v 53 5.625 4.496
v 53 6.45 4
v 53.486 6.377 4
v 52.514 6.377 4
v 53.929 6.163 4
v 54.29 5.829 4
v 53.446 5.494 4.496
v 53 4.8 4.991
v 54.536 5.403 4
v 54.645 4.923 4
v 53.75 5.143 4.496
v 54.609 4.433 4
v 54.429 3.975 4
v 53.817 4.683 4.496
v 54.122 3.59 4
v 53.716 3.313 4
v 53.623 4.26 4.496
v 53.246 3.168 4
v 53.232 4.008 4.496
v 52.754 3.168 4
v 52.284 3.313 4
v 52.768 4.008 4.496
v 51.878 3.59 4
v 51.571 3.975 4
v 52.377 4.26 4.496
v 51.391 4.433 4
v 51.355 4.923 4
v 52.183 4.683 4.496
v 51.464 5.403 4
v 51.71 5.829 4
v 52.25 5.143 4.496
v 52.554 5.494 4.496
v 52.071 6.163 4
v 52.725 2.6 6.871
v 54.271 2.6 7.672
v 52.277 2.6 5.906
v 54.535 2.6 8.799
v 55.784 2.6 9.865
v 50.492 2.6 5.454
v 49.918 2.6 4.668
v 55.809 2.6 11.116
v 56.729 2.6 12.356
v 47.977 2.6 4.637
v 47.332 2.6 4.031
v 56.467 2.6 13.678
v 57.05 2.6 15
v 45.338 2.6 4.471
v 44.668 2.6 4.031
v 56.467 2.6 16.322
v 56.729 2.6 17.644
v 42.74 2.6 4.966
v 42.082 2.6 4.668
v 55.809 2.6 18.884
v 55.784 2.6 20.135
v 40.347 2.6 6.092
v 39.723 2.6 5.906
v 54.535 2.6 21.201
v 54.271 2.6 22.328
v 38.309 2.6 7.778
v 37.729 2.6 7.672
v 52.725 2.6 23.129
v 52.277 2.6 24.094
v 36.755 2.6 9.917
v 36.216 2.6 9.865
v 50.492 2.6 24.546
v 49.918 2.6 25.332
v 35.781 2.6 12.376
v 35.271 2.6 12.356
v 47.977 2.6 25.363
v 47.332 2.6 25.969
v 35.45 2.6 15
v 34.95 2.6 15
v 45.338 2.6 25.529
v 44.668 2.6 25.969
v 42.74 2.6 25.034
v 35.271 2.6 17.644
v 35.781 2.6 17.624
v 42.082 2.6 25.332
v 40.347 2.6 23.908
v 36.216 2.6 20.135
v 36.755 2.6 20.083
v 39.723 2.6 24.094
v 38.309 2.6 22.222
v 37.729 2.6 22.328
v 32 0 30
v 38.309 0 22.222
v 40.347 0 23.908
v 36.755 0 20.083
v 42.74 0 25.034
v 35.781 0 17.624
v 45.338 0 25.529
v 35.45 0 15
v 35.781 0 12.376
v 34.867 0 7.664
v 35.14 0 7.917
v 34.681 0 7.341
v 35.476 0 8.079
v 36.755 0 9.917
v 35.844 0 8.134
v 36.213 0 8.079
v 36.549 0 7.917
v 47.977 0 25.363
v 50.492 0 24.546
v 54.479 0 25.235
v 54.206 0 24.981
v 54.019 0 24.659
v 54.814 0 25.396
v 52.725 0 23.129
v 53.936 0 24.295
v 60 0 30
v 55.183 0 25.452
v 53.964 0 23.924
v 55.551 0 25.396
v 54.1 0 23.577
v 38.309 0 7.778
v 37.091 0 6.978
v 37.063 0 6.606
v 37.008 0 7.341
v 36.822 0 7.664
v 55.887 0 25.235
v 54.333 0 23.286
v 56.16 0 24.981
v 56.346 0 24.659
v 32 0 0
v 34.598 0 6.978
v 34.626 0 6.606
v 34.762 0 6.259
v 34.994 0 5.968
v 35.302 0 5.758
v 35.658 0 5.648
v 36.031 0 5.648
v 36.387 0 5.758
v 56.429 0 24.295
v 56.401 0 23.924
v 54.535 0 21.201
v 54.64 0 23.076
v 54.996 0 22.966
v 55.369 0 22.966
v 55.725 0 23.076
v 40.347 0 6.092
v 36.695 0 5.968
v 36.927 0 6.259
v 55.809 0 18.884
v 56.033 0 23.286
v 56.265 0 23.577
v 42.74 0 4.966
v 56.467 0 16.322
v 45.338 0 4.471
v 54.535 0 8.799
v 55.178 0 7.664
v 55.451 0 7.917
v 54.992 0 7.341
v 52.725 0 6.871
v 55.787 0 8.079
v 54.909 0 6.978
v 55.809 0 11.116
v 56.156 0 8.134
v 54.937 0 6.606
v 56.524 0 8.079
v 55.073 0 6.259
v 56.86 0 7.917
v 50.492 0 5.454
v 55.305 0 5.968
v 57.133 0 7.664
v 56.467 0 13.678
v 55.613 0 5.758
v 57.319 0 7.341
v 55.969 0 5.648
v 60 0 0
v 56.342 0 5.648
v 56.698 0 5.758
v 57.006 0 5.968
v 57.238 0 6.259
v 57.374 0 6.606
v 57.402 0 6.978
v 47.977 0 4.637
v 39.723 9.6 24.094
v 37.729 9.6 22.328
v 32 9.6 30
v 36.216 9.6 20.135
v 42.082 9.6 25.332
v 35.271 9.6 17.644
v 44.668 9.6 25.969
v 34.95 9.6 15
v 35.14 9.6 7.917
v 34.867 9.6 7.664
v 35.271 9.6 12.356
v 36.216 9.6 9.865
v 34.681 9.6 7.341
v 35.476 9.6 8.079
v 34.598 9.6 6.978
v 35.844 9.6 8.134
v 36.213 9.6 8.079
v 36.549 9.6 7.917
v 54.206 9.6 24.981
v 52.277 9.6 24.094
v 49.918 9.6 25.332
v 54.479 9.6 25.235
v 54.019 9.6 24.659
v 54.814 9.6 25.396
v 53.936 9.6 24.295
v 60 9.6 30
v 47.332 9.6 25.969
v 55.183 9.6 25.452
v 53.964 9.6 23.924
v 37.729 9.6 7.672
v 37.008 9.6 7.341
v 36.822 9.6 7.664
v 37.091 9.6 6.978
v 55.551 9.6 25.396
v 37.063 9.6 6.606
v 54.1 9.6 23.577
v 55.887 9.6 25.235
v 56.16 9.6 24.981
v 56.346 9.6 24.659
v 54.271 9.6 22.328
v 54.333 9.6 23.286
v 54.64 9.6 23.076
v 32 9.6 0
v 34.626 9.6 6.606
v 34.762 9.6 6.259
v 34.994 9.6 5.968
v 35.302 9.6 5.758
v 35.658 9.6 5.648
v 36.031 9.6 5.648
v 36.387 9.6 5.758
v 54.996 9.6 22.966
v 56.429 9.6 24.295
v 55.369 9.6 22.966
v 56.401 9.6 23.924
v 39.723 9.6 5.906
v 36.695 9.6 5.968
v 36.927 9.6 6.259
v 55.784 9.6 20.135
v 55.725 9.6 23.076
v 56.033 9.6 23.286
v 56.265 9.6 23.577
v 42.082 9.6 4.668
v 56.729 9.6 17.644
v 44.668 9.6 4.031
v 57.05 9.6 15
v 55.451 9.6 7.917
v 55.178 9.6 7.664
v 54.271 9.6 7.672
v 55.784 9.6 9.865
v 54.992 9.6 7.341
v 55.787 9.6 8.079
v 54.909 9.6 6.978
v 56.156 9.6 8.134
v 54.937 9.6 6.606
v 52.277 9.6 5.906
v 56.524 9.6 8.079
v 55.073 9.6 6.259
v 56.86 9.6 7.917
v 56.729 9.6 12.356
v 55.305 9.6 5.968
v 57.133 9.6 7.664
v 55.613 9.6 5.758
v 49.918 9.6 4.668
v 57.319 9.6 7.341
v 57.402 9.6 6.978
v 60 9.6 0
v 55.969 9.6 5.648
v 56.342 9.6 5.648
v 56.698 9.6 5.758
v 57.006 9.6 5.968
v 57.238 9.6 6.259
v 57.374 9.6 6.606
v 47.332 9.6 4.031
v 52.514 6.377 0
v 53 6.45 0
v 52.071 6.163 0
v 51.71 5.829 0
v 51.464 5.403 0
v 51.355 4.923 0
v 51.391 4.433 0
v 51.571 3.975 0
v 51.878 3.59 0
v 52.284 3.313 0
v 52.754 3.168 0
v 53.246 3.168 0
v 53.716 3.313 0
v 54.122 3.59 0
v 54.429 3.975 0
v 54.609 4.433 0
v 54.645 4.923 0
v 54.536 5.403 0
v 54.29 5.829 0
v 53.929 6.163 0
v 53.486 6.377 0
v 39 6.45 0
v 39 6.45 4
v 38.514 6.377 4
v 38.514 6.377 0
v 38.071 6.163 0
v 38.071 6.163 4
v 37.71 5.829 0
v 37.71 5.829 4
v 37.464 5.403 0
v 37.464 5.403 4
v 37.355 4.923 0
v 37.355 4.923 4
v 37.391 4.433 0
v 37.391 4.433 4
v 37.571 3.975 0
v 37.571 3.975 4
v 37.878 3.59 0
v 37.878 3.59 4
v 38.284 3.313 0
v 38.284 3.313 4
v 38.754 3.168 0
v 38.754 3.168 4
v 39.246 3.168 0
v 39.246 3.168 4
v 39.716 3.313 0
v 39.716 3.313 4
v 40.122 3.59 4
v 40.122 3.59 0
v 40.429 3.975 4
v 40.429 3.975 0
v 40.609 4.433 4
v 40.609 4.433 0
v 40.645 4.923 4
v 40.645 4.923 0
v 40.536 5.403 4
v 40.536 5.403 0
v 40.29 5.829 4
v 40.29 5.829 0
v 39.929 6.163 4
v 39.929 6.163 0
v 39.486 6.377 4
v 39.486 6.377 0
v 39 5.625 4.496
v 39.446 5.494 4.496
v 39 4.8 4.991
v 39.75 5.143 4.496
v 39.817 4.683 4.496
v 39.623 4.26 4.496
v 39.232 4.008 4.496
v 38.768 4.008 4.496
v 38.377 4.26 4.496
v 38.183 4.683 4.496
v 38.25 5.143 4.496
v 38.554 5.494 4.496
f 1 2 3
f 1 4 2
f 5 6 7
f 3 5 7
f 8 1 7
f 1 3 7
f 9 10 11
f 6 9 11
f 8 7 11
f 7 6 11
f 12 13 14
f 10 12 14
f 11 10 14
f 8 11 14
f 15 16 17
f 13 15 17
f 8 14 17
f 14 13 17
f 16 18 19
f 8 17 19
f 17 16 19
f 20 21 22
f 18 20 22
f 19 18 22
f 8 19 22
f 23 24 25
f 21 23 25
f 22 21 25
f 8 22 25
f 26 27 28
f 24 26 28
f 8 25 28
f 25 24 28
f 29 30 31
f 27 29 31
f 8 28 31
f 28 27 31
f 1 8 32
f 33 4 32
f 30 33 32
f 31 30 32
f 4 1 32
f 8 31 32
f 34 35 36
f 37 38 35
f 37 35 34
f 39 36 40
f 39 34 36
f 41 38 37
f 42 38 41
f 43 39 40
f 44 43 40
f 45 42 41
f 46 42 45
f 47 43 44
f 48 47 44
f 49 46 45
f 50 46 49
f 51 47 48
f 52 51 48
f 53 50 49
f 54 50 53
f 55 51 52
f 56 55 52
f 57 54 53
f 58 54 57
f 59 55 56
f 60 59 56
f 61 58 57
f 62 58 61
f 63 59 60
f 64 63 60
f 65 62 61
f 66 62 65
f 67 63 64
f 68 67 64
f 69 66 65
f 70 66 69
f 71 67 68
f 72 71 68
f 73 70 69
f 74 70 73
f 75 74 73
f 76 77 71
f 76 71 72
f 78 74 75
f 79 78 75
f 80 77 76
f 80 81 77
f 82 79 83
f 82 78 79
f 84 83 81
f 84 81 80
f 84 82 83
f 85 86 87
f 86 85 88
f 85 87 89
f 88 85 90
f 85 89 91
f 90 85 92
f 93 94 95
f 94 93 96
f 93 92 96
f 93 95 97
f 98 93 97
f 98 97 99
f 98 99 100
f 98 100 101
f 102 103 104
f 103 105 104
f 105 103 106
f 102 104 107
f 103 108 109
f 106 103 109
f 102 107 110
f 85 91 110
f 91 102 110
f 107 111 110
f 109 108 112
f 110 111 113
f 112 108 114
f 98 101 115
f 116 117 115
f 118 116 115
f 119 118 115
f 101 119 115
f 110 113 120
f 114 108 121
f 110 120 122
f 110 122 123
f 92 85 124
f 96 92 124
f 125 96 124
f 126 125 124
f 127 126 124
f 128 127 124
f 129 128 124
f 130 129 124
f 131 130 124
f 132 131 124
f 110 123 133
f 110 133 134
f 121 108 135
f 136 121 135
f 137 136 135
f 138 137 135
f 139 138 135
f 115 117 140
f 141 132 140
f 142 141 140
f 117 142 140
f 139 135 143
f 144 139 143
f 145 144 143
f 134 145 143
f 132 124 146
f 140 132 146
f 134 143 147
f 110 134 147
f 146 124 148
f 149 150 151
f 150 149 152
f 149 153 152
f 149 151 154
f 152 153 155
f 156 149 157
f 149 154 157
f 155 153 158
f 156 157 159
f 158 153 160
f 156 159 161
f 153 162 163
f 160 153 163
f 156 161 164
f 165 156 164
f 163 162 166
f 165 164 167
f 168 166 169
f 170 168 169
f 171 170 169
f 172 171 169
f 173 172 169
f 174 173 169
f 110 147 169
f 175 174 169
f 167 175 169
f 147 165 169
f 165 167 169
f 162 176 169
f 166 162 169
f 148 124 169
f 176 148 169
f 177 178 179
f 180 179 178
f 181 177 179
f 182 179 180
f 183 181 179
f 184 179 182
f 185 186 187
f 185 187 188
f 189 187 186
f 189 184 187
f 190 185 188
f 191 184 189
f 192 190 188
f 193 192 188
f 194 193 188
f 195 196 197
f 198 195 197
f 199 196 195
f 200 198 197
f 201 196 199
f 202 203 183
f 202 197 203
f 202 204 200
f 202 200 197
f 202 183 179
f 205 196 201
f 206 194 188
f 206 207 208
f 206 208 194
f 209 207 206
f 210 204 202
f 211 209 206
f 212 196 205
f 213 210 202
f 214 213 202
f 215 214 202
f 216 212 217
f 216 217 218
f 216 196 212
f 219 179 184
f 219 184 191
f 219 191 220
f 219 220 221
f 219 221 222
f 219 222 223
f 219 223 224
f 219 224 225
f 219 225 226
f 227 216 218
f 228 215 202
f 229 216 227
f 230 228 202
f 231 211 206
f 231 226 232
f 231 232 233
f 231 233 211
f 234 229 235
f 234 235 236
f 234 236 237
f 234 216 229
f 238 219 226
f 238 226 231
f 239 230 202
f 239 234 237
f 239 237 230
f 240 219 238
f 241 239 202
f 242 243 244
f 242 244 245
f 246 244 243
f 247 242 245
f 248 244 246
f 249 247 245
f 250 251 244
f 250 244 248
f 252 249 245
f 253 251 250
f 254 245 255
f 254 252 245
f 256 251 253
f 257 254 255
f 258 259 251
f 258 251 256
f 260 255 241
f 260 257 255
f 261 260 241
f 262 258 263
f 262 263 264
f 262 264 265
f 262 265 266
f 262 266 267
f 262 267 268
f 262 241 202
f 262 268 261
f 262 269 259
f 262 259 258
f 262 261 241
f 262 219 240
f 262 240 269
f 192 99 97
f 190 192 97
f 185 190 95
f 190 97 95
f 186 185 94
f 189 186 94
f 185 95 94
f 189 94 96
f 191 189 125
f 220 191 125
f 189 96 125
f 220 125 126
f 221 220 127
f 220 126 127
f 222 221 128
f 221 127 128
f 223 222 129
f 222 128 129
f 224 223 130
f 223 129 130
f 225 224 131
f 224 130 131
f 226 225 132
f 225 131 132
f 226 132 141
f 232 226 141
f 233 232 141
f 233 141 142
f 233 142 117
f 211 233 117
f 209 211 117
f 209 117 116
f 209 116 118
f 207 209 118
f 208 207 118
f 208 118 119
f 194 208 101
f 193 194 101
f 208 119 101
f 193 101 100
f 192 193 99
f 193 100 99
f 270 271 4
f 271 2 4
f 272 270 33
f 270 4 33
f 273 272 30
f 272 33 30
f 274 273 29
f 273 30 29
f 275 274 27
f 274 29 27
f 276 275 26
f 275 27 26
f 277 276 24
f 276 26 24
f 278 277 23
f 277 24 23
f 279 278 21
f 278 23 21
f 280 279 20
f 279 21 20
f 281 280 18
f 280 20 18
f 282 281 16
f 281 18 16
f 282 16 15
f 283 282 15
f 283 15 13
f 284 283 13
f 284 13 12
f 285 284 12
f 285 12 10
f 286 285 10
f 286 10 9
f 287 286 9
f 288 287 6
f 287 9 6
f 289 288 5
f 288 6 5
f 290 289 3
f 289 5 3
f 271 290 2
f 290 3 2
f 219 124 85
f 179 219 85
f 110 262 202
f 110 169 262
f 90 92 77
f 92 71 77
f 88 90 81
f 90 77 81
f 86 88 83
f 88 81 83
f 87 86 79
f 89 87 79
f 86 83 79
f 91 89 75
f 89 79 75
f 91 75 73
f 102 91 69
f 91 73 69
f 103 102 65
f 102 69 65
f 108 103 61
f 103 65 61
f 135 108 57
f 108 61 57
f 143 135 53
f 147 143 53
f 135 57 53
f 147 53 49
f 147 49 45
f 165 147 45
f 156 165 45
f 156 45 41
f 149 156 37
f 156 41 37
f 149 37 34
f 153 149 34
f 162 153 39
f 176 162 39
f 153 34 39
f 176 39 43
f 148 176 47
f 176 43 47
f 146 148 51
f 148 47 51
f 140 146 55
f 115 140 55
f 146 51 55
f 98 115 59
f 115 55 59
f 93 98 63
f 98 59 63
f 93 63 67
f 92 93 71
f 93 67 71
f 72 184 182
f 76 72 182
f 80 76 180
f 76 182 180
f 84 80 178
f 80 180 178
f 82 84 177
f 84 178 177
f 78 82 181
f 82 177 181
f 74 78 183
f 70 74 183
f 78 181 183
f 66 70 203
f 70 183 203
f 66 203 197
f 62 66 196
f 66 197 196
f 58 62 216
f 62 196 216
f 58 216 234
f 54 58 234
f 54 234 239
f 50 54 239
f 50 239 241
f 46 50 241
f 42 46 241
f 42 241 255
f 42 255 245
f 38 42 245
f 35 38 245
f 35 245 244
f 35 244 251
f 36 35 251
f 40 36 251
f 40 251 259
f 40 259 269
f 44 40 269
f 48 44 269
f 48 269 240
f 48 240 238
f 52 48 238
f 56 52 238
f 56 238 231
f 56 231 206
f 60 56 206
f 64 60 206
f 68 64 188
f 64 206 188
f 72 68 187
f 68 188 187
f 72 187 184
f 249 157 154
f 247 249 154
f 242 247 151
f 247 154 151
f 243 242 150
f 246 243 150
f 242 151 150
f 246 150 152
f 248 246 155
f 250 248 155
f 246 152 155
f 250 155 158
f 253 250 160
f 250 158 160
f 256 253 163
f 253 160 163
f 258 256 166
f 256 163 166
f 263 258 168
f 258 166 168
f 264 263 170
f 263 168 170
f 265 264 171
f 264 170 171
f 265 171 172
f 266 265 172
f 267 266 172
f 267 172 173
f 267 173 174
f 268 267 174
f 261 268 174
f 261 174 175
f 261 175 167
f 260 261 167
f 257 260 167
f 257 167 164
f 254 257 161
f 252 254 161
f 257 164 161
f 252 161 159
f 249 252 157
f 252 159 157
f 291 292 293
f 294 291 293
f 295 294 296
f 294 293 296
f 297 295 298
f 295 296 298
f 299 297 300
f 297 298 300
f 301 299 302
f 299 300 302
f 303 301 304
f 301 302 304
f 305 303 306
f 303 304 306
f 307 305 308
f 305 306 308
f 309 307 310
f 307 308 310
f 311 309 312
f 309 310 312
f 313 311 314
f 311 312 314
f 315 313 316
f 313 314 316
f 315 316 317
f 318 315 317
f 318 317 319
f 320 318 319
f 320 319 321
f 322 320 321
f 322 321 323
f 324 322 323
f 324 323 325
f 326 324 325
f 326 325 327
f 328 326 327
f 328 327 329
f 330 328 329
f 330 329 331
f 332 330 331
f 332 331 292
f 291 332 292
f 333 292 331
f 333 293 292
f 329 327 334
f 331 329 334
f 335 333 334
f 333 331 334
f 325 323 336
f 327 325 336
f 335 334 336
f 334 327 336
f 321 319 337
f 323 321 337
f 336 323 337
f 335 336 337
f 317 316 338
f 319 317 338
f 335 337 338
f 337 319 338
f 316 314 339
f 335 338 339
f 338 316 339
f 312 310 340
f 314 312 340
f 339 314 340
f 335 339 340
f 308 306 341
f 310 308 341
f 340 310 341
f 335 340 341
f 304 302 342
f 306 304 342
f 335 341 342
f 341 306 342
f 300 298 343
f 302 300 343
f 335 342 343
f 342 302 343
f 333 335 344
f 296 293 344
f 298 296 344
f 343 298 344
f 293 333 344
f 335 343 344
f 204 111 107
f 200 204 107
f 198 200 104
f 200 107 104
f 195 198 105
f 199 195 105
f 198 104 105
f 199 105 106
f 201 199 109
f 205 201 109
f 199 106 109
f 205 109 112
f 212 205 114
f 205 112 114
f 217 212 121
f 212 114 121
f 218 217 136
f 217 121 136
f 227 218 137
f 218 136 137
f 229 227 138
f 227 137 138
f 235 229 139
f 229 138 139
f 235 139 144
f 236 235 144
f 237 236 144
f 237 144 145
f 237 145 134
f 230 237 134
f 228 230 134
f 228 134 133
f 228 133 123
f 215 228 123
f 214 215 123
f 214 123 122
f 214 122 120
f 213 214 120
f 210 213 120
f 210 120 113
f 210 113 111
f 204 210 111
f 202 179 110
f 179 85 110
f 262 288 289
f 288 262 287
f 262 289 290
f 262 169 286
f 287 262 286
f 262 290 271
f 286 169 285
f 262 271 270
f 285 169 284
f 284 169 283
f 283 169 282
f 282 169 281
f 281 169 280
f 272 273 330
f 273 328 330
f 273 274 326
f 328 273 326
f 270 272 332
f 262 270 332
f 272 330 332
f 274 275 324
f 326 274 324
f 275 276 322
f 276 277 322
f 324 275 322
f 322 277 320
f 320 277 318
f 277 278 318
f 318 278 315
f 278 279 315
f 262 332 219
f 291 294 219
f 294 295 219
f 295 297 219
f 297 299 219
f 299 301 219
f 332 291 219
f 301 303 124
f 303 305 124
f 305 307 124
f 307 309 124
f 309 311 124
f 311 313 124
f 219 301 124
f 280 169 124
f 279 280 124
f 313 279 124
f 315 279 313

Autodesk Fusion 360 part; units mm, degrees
sketch "Sketch1" plane through (0, 0, 0) normal (0, 1, 0) x (1, 0, 0)
  line L0 (60, 0) -> (60, -30)
  line L1 (0, -15) -> (60, -15) construction
  line L2 (32, 0) -> (32, -30) construction
  line L3 (46, 0) -> (46, -30) construction
  line L4 (60, 0) -> (32, 0)
  line L5 (32, 0) -> (32, -30)
  line L6 (32, -30) -> (60, -30)
  line L7 (60, -30) -> (60, 0)
  dimension "d39" = 14
  dimension "d40" = 28
  dimension "d42" = 30
extrude "Extrude1" add sketch "Sketch1" along normal blind 9.6
sketch "Sketch2" plane through (0, 9.6, 0) normal (0, 1, 0) x (-1, 0, 0)
  line L0 (-60, 30) -> (-60, 0)
  circle A0 centre (-46, 15) radius 11.05
  circle A1 centre (-46, 15) radius 10.55
  line L1 (-60, 0) -> (-32, 0)
  line L2 (-32, 0) -> (-32, 30)
  line L3 (-32, 30) -> (-60, 30)
  dimension "d15" = 22.1
  dimension "d16" = 21.1
extrude "Extrude2" cut sketch "Sketch2" against normal blind 7 contours A0
extrude "Extrude3" cut 1 faces at (43.0944, 9.6, 14.0673) along direction (0, 1, 0) through all and the other way through all
sketch "Sketch3" plane through (0, 9.6, 0) normal (0, 1, 0) x (-1, 0, 0)
  line L0 (-60, 30) -> (-60, 0)
  circle A0 centre (-46, 15) radius 13 construction
  line L1 (-32, 30) -> (-60, 30)
  line L2 (-60, 0) -> (-32, 0)
  line L3 (-32, 0) -> (-32, 30)
  circle A1 centre (-46, 15) radius 11.05
  point P0 (-35.8444, 6.8844)
  point P1 (-55.1828, 24.202)
  point P2 (-56.1556, 6.8844)
  dimension "d30" = 26
hole "Hole1" at (35.8444, 9.6, 6.8844) direction (0, -1, 0) diameter 2.5 end through all
hole "Hole2" at (56.1556, 9.6, 6.8844) direction (0, -1, 0) diameter 2.5 end through all
hole "Hole3" at (55.1828, 9.6, 24.202) direction (0, -1, 0) diameter 2.5 end through all
sketch "Sketch4" plane through (0, 0, 0) normal (0, 0, -1) x (-1, 0, 0)
  line L0 (-60, 0) -> (-32, 0)
  line L1 (-32, 0) -> (-32, 9.6)
  line L2 (-32, 9.6) -> (-60, 9.6)
  line L3 (-60, 9.6) -> (-60, 0)
  line L4 (-32, 4.8) -> (-60, 4.8) construction
  line L5 (-39, 0) -> (-39, 9.6) construction
  line L6 (-53, 0) -> (-53, 9.6) construction
  point P0 (-39, 4.8)
  point P1 (-53, 4.8)
  dimension "d43" = 14
  dimension "d44" = 7
hole "Hole4" at (39, 4.8, 0) direction (0, 0, 1) diameter 3.3 depth 4 tip angle 118
hole "Hole5" at (53, 4.8, 0) direction (0, 0, 1) diameter 3.3 depth 4 tip angle 118
